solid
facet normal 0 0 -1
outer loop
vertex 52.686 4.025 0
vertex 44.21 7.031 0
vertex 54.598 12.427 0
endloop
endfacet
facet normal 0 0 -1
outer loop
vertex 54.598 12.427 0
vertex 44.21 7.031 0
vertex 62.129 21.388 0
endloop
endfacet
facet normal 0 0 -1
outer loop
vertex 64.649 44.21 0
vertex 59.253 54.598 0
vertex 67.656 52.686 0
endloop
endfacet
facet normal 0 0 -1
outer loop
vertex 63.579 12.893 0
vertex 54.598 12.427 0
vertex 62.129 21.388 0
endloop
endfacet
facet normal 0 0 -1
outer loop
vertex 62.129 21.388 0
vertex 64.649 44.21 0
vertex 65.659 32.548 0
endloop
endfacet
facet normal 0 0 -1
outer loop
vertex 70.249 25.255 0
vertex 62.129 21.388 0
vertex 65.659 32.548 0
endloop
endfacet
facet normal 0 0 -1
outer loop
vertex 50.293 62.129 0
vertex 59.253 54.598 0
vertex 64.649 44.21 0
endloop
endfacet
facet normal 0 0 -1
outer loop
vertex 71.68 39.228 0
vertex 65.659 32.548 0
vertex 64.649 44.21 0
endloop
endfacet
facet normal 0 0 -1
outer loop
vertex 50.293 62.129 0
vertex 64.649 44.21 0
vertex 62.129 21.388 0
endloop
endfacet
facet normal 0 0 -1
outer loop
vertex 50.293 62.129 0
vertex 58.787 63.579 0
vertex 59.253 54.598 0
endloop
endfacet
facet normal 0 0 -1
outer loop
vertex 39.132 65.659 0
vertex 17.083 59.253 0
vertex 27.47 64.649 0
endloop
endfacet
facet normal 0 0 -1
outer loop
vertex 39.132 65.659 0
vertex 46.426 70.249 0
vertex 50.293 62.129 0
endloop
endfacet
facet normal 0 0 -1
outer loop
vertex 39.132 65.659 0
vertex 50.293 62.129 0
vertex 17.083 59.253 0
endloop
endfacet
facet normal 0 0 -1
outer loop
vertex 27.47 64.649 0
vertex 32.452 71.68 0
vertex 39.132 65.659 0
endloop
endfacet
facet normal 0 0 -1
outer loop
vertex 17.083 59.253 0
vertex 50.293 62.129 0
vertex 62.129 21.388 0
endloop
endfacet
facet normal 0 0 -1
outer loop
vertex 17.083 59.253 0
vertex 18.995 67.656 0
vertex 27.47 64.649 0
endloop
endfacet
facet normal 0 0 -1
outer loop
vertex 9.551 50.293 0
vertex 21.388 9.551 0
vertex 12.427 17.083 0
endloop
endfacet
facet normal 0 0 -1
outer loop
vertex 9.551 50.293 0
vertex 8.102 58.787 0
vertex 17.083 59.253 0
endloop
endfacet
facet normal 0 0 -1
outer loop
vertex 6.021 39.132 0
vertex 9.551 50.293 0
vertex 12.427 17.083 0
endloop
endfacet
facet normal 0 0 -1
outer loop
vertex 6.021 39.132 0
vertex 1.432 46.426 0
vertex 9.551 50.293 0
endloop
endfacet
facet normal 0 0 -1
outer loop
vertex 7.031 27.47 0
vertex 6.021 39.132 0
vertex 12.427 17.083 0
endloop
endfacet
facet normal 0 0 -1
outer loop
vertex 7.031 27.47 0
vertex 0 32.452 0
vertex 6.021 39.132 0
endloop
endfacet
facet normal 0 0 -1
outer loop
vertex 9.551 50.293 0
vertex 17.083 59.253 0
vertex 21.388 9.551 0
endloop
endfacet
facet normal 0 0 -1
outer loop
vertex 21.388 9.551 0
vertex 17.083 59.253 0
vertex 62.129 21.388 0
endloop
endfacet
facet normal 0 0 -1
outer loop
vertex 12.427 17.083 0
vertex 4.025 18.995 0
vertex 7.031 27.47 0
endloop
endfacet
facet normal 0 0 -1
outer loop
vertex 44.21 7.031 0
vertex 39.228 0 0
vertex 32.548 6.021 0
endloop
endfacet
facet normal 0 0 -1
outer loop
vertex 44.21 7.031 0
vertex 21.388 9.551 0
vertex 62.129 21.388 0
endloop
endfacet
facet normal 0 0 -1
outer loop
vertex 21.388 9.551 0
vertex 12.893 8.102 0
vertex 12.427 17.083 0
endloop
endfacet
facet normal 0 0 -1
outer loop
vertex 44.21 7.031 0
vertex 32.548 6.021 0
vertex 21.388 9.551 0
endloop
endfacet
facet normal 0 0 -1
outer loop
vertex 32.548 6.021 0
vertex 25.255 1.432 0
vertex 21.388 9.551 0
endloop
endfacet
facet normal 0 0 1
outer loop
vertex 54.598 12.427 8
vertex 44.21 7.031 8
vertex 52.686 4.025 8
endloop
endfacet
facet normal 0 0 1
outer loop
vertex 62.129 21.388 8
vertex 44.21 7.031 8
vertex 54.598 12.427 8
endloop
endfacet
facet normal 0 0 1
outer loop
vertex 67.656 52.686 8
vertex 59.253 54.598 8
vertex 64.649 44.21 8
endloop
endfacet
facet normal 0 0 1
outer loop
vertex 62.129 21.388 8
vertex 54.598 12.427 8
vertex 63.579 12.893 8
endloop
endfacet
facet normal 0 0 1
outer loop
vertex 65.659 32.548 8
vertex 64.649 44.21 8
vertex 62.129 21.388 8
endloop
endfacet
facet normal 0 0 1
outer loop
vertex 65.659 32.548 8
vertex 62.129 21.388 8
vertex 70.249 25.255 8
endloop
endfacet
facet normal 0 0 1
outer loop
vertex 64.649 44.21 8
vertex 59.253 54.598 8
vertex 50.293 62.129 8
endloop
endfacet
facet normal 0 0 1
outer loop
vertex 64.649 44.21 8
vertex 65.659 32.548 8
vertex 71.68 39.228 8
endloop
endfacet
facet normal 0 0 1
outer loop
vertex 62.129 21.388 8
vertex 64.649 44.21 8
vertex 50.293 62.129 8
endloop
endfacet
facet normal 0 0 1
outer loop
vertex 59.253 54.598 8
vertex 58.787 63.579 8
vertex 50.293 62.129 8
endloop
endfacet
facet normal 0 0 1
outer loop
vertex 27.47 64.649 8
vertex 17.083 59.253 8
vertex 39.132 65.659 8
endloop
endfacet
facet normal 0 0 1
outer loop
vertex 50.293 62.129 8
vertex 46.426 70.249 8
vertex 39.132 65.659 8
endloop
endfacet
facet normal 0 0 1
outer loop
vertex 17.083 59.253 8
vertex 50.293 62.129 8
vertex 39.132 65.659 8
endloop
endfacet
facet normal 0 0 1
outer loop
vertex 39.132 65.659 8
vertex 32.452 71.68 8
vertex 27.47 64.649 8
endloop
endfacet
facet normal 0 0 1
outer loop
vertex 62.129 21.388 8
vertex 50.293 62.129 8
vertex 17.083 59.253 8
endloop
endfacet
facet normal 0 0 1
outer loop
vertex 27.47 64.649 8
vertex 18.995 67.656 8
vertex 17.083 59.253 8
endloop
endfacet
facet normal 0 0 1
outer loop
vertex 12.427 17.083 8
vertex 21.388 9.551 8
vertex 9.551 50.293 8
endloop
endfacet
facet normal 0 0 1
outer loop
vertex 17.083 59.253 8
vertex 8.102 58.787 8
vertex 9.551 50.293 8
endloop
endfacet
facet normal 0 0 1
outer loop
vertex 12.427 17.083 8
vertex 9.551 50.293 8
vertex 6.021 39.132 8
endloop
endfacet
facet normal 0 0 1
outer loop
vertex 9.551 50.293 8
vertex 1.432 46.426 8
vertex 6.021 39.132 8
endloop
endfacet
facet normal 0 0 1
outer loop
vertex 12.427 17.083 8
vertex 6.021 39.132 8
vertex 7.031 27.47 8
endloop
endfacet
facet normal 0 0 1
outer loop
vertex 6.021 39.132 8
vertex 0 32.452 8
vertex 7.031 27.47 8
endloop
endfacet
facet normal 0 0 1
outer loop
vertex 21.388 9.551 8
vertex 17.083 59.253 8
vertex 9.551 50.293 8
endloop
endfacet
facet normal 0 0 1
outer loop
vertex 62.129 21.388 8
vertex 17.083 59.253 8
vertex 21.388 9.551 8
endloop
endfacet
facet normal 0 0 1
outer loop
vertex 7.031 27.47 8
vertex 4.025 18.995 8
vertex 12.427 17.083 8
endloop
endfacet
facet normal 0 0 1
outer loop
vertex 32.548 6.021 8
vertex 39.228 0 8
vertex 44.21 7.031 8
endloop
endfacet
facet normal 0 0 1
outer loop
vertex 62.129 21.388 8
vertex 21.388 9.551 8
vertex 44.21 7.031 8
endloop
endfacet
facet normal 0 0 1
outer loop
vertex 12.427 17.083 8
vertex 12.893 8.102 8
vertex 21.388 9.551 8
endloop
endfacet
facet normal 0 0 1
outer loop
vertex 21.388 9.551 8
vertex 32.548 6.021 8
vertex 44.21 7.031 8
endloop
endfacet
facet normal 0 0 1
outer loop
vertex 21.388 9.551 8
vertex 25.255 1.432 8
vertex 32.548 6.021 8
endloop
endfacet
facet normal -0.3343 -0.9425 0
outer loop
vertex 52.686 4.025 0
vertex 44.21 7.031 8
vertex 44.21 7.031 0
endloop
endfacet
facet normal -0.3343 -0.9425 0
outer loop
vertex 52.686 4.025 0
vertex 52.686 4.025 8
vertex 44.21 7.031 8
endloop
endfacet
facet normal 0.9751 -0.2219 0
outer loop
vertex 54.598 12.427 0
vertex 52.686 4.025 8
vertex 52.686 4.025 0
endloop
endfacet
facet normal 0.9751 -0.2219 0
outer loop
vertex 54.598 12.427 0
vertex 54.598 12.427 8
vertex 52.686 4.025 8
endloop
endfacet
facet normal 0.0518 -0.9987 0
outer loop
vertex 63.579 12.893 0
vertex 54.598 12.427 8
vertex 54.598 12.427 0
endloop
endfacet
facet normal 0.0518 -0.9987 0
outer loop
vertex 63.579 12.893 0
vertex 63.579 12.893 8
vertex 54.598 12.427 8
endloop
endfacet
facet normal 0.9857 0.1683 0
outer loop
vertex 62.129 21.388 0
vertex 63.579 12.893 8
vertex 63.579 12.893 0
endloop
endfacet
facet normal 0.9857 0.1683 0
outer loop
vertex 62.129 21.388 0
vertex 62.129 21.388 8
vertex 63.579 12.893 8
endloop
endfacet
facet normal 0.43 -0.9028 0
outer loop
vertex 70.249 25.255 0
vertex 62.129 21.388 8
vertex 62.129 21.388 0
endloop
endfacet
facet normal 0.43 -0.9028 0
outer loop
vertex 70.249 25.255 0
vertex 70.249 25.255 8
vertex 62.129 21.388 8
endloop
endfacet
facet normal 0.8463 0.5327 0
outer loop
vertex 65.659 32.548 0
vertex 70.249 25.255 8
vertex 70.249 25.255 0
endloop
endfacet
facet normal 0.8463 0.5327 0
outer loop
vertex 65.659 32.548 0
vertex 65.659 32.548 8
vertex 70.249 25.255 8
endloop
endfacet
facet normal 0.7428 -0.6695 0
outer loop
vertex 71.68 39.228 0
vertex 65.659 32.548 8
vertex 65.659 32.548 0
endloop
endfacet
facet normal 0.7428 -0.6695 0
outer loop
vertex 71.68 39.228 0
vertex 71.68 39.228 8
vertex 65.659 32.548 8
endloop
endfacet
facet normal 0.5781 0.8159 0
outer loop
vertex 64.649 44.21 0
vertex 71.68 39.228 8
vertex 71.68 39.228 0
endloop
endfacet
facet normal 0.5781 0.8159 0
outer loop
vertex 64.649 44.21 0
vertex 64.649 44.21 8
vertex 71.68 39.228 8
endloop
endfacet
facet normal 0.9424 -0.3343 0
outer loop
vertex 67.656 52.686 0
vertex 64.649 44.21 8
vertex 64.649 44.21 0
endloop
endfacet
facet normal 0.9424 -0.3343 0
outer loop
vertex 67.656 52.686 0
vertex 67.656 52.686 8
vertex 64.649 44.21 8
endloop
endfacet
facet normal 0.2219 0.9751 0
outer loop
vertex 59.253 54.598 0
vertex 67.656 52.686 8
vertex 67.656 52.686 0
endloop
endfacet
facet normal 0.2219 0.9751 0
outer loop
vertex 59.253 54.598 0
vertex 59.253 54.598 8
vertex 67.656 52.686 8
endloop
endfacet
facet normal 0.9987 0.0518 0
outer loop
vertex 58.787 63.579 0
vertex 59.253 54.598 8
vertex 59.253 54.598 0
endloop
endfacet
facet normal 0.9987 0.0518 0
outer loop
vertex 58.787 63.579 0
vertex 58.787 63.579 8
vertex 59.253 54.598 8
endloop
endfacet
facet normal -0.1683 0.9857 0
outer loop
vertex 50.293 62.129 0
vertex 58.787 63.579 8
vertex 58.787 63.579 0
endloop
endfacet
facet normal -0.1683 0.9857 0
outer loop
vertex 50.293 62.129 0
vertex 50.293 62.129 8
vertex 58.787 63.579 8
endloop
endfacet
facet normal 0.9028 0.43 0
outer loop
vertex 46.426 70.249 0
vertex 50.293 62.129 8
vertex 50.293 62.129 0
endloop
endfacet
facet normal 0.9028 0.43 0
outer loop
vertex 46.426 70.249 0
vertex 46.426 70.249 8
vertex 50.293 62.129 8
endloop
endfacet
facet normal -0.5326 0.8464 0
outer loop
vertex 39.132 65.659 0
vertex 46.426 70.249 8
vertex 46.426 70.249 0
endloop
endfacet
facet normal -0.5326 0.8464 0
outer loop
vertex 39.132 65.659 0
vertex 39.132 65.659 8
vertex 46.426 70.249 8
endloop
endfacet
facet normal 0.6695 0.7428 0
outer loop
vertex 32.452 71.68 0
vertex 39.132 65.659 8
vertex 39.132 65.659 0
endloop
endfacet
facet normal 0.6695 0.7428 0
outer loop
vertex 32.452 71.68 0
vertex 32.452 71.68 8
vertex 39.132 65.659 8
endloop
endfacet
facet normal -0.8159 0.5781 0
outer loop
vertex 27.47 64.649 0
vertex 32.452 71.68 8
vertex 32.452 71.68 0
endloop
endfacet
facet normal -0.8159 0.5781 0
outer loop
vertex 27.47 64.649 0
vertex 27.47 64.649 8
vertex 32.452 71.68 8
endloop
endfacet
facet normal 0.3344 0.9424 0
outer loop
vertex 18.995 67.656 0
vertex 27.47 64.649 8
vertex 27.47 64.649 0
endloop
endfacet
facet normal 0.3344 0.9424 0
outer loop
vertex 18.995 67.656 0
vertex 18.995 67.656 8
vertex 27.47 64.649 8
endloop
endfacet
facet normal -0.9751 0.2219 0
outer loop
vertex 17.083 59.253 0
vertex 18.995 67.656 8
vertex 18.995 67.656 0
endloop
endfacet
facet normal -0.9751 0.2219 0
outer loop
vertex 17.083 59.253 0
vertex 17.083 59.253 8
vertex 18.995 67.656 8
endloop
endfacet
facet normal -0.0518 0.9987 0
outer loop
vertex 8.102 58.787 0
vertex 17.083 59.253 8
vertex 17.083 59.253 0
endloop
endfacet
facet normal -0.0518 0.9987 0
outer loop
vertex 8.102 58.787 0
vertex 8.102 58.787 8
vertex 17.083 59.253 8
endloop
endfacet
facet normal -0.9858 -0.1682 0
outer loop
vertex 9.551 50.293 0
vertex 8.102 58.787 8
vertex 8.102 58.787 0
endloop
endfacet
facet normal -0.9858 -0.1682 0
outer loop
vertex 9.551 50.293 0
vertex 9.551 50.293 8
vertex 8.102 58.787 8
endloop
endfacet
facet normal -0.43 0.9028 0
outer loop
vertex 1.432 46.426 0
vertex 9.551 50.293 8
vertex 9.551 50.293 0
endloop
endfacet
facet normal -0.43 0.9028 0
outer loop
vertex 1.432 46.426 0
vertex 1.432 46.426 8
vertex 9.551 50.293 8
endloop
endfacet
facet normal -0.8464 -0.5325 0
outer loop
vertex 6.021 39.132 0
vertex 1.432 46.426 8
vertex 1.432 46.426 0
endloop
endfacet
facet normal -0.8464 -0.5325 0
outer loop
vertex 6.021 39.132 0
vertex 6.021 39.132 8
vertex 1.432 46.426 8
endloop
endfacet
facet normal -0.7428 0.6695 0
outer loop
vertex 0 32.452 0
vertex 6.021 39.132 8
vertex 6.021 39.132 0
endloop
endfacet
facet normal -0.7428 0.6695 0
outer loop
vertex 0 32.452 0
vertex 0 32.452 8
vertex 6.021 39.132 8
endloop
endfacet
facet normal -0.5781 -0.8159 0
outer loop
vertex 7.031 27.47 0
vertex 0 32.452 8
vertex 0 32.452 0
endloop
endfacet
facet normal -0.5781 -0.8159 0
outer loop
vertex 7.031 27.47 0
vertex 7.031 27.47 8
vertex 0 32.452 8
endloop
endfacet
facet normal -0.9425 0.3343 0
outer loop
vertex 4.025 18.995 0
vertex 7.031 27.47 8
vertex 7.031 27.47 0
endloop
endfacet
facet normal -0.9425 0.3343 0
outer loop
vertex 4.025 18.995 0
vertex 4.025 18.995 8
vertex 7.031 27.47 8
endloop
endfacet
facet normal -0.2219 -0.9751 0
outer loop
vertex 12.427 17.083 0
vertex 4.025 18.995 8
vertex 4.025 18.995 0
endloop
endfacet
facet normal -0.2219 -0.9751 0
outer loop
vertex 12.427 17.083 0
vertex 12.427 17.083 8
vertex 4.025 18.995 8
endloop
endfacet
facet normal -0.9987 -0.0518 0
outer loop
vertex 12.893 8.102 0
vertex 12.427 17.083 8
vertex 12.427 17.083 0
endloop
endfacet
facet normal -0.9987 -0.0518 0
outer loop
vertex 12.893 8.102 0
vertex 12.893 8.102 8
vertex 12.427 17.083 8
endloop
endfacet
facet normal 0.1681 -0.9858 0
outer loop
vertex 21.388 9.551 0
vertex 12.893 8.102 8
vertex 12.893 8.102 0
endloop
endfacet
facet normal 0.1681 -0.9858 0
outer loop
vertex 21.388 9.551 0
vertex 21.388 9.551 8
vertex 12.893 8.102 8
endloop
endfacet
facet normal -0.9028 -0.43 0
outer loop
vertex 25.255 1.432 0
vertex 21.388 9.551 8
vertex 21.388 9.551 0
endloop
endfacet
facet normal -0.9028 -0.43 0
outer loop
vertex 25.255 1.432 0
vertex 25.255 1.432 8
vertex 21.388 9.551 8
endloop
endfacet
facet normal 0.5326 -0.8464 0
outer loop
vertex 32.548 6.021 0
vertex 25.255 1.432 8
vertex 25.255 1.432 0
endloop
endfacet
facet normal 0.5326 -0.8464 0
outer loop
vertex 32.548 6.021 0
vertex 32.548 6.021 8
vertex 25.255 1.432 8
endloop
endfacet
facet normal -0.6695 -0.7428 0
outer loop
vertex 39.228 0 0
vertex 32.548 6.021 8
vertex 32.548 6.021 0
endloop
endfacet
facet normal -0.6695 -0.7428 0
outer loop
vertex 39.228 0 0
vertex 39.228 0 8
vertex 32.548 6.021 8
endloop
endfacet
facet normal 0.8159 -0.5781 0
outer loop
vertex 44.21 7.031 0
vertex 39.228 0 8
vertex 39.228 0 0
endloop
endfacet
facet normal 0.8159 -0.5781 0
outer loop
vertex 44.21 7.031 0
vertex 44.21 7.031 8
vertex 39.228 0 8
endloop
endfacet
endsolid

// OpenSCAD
$fn = 32;

// ----------------------------------------------------------------------
// Chain sprocket: 16 teeth, 30 mm root radius
// ----------------------------------------------------------------------

// --- parameters (mm) ---
profile_height = 8;       // extrusion height
profile_points = 32;      // points of the closed outline

profile = [[65.659, 32.548], [71.68, 39.228], [64.649, 44.21], [67.656, 52.686], [59.253, 54.598], [58.787, 63.579], [50.293, 62.129], [46.426, 70.249], [39.132, 65.659], [32.452, 71.68], [27.47, 64.649], [18.995, 67.656], [17.083, 59.253], [8.102, 58.787], [9.551, 50.293], [1.432, 46.426], [6.021, 39.132], [0, 32.452], [7.031, 27.47], [4.025, 18.995], [12.427, 17.083], [12.893, 8.102], [21.388, 9.551], [25.255, 1.432], [32.548, 6.021], [39.228, 0], [44.21, 7.031], [52.686, 4.025], [54.598, 12.427], [63.579, 12.893], [62.129, 21.388], [70.249, 25.255]];  // single closed polygon, 32 points, counter clockwise

// --- the one profile operation ---
linear_extrude(height = profile_height) polygon(points = profile);
